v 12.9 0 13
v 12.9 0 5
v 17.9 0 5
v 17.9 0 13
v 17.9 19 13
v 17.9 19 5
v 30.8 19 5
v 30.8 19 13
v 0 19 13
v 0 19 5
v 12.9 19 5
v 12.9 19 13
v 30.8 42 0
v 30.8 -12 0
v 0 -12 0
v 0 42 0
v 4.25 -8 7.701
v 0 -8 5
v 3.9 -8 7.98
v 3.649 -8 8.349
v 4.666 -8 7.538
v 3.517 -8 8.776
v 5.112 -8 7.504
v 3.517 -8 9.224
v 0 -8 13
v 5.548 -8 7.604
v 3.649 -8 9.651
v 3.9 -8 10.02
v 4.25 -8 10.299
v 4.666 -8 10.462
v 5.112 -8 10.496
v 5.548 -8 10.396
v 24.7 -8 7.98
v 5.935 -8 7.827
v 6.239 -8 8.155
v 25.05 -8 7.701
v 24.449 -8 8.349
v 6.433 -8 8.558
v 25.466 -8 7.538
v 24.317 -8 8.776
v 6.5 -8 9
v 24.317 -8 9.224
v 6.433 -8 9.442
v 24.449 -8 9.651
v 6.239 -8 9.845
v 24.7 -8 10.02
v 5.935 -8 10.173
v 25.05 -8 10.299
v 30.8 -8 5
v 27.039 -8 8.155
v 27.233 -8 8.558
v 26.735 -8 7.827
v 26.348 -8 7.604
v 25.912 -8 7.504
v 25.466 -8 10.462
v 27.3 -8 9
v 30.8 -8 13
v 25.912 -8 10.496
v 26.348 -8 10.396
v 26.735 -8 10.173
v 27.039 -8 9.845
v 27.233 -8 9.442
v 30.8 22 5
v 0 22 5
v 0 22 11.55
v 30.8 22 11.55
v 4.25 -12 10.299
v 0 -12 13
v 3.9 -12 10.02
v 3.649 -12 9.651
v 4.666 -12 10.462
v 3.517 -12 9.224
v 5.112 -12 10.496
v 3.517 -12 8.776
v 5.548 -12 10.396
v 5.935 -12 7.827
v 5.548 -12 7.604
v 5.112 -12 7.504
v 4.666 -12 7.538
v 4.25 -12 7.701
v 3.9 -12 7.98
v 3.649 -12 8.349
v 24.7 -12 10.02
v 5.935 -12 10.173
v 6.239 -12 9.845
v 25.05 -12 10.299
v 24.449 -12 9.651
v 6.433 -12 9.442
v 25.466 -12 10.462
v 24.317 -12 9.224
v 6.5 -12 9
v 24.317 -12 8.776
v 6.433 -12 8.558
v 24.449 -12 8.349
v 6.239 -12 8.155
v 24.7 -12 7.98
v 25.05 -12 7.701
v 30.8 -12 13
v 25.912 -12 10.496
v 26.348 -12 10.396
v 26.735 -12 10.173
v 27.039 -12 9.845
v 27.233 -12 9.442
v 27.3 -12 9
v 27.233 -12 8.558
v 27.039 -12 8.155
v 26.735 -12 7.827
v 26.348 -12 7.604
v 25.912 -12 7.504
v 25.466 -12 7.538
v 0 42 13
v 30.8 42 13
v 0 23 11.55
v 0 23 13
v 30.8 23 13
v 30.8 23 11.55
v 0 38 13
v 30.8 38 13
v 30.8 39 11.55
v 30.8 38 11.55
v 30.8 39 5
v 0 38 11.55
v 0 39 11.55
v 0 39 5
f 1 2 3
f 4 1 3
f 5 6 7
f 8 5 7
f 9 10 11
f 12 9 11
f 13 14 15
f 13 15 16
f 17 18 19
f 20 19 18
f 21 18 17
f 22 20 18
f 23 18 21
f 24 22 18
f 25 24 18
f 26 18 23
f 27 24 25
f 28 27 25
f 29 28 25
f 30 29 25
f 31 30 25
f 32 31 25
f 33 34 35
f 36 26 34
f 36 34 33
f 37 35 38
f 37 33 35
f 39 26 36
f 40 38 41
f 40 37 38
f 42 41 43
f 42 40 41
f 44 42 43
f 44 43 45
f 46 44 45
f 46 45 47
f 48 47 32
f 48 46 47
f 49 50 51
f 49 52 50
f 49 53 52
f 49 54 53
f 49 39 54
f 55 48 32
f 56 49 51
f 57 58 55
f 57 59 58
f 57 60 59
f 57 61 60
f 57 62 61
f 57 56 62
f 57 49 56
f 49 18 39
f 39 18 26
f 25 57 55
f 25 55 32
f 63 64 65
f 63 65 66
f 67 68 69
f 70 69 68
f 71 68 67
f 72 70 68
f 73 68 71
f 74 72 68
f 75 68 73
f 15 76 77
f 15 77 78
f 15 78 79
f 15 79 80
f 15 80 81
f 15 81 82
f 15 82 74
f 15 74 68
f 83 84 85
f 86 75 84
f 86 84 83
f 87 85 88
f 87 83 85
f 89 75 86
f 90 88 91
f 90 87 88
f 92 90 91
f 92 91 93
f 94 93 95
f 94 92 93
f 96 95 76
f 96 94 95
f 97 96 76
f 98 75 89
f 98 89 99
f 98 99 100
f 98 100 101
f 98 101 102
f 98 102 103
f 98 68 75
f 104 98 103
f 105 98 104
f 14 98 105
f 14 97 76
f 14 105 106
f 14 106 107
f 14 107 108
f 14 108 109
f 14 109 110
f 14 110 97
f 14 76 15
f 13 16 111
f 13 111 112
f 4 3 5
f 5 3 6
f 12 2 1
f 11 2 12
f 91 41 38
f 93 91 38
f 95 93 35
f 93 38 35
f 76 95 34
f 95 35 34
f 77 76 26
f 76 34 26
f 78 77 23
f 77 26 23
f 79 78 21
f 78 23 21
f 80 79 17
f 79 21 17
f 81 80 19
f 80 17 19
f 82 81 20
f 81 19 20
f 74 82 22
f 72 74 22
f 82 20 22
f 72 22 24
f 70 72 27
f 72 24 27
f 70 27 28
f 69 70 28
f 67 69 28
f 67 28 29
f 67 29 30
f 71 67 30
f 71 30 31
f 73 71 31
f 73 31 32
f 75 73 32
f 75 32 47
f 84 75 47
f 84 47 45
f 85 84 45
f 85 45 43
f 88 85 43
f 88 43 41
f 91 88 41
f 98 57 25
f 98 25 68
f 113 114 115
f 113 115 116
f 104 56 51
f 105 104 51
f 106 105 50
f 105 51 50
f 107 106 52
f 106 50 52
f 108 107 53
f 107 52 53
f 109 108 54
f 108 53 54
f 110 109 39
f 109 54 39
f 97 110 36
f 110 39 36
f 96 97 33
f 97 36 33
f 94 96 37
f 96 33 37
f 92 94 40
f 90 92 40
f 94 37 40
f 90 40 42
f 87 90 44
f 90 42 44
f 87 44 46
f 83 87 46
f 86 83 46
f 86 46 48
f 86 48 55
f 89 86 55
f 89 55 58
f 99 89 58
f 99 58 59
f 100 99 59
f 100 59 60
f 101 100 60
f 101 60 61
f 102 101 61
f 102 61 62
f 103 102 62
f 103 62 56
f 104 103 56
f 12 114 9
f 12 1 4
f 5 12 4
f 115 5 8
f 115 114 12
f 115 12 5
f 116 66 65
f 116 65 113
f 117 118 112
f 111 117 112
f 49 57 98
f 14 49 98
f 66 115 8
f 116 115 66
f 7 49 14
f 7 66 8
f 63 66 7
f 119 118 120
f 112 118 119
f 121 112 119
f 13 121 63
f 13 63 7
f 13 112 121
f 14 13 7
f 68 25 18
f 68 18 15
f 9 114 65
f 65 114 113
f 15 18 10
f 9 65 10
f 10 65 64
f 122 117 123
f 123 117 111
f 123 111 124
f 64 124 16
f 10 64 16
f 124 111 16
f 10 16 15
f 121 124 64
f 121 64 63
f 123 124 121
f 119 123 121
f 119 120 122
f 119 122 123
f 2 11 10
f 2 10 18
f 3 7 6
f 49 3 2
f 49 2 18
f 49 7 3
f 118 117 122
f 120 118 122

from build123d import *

# Parameters (mm, degrees)
SKETCH_1_W          = 30.8
SKETCH_1_H          = 42
EXTRUDE_1_DEPTH     = 5
SKETCH_2_W          = 30.8
SKETCH_2_H          = 3
EXTRUDE_2_DEPTH     = 8
SKETCH_3_W          = 5
SKETCH_3_H          = 19
EXTRUDE_3_DEPTH     = 8
EXTRUDE_4_DEPTH     = 30.8
CUT_EXTRUDE_1_REACH = 6
SKETCH_5_R          = 1.5
SKETCH_6_W          = 1.45
SKETCH_6_H          = 1
EXTRUDE_5_DEPTH     = 30.8


with BuildPart() as part:
    # 草图1 → 凸台-拉伸1 (new body)
    with BuildSketch(Plane.XY):
        with Locations((15.4, 21)):
            Rectangle(SKETCH_1_W, SKETCH_1_H)
    extrude(amount=EXTRUDE_1_DEPTH)

    # 草图2 → 凸台-拉伸2 (add)
    with BuildSketch(Plane.XY.offset(5)):
        with Locations((15.4, 40.5)):
            Rectangle(SKETCH_2_W, SKETCH_2_H)
        with Locations((15.4, 20.5)):
            Rectangle(SKETCH_2_W, SKETCH_2_H)
    extrude(amount=EXTRUDE_2_DEPTH)

    # 草图3 → 凸台-拉伸3 (add)
    with BuildSketch(Plane.XY.offset(5)):
        with Locations((15.4, 9.5)):
            Rectangle(SKETCH_3_W, SKETCH_3_H)
    extrude(amount=EXTRUDE_3_DEPTH)

    # 草图4 → 凸台-拉伸4 (add)
    with BuildSketch(Plane(origin=(30.8, 0, 0), x_dir=(0, 0, -1), z_dir=(1, 0, 0))):
        Polygon((-5, 0), (-5, -8), (-13, -8), (-13, -12), (0, -12), (0, 0), align=None)
    extrude(amount=-EXTRUDE_4_DEPTH)

    # 草图5 → 切除-拉伸1 (cut, up to next)
    with BuildSketch(Plane(origin=(0, -8, 0), x_dir=(1, 0, 0), z_dir=(0, 1, 0)), mode=Mode.PRIVATE) as cut_extrude_1_sk1:
        with Locations((5, -9)):
            Circle(SKETCH_5_R)
    cut_extrude_1_tool1 = extrude(cut_extrude_1_sk1.sketch, amount=-CUT_EXTRUDE_1_REACH, mode=Mode.PRIVATE) & part.part
    add(cut_extrude_1_tool1.solids().sort_by_distance((5, -8, 9))[0], mode=Mode.SUBTRACT)
    # 草图5 → 切除-拉伸1 (cut, up to next)
    with BuildSketch(Plane(origin=(0, -8, 0), x_dir=(1, 0, 0), z_dir=(0, 1, 0)), mode=Mode.PRIVATE) as cut_extrude_1_sk2:
        with Locations((25.8, -9)):
            Circle(SKETCH_5_R)
    cut_extrude_1_tool2 = extrude(cut_extrude_1_sk2.sketch, amount=-CUT_EXTRUDE_1_REACH, mode=Mode.PRIVATE) & part.part
    add(cut_extrude_1_tool2.solids().sort_by_distance((25.8, -8, 9))[0], mode=Mode.SUBTRACT)

    # 草图6 → 凸台-拉伸5 (add, through all)
    with BuildSketch(Plane(origin=(30.8, 0, 0), x_dir=(0, 0, -1), z_dir=(1, 0, 0))):
        with Locations((-12.275, 38.5)):
            Rectangle(SKETCH_6_W, SKETCH_6_H)
        with Locations((-12.275, 22.5)):
            Rectangle(SKETCH_6_W, SKETCH_6_H)
    extrude(amount=-EXTRUDE_5_DEPTH)


solid = part.part
